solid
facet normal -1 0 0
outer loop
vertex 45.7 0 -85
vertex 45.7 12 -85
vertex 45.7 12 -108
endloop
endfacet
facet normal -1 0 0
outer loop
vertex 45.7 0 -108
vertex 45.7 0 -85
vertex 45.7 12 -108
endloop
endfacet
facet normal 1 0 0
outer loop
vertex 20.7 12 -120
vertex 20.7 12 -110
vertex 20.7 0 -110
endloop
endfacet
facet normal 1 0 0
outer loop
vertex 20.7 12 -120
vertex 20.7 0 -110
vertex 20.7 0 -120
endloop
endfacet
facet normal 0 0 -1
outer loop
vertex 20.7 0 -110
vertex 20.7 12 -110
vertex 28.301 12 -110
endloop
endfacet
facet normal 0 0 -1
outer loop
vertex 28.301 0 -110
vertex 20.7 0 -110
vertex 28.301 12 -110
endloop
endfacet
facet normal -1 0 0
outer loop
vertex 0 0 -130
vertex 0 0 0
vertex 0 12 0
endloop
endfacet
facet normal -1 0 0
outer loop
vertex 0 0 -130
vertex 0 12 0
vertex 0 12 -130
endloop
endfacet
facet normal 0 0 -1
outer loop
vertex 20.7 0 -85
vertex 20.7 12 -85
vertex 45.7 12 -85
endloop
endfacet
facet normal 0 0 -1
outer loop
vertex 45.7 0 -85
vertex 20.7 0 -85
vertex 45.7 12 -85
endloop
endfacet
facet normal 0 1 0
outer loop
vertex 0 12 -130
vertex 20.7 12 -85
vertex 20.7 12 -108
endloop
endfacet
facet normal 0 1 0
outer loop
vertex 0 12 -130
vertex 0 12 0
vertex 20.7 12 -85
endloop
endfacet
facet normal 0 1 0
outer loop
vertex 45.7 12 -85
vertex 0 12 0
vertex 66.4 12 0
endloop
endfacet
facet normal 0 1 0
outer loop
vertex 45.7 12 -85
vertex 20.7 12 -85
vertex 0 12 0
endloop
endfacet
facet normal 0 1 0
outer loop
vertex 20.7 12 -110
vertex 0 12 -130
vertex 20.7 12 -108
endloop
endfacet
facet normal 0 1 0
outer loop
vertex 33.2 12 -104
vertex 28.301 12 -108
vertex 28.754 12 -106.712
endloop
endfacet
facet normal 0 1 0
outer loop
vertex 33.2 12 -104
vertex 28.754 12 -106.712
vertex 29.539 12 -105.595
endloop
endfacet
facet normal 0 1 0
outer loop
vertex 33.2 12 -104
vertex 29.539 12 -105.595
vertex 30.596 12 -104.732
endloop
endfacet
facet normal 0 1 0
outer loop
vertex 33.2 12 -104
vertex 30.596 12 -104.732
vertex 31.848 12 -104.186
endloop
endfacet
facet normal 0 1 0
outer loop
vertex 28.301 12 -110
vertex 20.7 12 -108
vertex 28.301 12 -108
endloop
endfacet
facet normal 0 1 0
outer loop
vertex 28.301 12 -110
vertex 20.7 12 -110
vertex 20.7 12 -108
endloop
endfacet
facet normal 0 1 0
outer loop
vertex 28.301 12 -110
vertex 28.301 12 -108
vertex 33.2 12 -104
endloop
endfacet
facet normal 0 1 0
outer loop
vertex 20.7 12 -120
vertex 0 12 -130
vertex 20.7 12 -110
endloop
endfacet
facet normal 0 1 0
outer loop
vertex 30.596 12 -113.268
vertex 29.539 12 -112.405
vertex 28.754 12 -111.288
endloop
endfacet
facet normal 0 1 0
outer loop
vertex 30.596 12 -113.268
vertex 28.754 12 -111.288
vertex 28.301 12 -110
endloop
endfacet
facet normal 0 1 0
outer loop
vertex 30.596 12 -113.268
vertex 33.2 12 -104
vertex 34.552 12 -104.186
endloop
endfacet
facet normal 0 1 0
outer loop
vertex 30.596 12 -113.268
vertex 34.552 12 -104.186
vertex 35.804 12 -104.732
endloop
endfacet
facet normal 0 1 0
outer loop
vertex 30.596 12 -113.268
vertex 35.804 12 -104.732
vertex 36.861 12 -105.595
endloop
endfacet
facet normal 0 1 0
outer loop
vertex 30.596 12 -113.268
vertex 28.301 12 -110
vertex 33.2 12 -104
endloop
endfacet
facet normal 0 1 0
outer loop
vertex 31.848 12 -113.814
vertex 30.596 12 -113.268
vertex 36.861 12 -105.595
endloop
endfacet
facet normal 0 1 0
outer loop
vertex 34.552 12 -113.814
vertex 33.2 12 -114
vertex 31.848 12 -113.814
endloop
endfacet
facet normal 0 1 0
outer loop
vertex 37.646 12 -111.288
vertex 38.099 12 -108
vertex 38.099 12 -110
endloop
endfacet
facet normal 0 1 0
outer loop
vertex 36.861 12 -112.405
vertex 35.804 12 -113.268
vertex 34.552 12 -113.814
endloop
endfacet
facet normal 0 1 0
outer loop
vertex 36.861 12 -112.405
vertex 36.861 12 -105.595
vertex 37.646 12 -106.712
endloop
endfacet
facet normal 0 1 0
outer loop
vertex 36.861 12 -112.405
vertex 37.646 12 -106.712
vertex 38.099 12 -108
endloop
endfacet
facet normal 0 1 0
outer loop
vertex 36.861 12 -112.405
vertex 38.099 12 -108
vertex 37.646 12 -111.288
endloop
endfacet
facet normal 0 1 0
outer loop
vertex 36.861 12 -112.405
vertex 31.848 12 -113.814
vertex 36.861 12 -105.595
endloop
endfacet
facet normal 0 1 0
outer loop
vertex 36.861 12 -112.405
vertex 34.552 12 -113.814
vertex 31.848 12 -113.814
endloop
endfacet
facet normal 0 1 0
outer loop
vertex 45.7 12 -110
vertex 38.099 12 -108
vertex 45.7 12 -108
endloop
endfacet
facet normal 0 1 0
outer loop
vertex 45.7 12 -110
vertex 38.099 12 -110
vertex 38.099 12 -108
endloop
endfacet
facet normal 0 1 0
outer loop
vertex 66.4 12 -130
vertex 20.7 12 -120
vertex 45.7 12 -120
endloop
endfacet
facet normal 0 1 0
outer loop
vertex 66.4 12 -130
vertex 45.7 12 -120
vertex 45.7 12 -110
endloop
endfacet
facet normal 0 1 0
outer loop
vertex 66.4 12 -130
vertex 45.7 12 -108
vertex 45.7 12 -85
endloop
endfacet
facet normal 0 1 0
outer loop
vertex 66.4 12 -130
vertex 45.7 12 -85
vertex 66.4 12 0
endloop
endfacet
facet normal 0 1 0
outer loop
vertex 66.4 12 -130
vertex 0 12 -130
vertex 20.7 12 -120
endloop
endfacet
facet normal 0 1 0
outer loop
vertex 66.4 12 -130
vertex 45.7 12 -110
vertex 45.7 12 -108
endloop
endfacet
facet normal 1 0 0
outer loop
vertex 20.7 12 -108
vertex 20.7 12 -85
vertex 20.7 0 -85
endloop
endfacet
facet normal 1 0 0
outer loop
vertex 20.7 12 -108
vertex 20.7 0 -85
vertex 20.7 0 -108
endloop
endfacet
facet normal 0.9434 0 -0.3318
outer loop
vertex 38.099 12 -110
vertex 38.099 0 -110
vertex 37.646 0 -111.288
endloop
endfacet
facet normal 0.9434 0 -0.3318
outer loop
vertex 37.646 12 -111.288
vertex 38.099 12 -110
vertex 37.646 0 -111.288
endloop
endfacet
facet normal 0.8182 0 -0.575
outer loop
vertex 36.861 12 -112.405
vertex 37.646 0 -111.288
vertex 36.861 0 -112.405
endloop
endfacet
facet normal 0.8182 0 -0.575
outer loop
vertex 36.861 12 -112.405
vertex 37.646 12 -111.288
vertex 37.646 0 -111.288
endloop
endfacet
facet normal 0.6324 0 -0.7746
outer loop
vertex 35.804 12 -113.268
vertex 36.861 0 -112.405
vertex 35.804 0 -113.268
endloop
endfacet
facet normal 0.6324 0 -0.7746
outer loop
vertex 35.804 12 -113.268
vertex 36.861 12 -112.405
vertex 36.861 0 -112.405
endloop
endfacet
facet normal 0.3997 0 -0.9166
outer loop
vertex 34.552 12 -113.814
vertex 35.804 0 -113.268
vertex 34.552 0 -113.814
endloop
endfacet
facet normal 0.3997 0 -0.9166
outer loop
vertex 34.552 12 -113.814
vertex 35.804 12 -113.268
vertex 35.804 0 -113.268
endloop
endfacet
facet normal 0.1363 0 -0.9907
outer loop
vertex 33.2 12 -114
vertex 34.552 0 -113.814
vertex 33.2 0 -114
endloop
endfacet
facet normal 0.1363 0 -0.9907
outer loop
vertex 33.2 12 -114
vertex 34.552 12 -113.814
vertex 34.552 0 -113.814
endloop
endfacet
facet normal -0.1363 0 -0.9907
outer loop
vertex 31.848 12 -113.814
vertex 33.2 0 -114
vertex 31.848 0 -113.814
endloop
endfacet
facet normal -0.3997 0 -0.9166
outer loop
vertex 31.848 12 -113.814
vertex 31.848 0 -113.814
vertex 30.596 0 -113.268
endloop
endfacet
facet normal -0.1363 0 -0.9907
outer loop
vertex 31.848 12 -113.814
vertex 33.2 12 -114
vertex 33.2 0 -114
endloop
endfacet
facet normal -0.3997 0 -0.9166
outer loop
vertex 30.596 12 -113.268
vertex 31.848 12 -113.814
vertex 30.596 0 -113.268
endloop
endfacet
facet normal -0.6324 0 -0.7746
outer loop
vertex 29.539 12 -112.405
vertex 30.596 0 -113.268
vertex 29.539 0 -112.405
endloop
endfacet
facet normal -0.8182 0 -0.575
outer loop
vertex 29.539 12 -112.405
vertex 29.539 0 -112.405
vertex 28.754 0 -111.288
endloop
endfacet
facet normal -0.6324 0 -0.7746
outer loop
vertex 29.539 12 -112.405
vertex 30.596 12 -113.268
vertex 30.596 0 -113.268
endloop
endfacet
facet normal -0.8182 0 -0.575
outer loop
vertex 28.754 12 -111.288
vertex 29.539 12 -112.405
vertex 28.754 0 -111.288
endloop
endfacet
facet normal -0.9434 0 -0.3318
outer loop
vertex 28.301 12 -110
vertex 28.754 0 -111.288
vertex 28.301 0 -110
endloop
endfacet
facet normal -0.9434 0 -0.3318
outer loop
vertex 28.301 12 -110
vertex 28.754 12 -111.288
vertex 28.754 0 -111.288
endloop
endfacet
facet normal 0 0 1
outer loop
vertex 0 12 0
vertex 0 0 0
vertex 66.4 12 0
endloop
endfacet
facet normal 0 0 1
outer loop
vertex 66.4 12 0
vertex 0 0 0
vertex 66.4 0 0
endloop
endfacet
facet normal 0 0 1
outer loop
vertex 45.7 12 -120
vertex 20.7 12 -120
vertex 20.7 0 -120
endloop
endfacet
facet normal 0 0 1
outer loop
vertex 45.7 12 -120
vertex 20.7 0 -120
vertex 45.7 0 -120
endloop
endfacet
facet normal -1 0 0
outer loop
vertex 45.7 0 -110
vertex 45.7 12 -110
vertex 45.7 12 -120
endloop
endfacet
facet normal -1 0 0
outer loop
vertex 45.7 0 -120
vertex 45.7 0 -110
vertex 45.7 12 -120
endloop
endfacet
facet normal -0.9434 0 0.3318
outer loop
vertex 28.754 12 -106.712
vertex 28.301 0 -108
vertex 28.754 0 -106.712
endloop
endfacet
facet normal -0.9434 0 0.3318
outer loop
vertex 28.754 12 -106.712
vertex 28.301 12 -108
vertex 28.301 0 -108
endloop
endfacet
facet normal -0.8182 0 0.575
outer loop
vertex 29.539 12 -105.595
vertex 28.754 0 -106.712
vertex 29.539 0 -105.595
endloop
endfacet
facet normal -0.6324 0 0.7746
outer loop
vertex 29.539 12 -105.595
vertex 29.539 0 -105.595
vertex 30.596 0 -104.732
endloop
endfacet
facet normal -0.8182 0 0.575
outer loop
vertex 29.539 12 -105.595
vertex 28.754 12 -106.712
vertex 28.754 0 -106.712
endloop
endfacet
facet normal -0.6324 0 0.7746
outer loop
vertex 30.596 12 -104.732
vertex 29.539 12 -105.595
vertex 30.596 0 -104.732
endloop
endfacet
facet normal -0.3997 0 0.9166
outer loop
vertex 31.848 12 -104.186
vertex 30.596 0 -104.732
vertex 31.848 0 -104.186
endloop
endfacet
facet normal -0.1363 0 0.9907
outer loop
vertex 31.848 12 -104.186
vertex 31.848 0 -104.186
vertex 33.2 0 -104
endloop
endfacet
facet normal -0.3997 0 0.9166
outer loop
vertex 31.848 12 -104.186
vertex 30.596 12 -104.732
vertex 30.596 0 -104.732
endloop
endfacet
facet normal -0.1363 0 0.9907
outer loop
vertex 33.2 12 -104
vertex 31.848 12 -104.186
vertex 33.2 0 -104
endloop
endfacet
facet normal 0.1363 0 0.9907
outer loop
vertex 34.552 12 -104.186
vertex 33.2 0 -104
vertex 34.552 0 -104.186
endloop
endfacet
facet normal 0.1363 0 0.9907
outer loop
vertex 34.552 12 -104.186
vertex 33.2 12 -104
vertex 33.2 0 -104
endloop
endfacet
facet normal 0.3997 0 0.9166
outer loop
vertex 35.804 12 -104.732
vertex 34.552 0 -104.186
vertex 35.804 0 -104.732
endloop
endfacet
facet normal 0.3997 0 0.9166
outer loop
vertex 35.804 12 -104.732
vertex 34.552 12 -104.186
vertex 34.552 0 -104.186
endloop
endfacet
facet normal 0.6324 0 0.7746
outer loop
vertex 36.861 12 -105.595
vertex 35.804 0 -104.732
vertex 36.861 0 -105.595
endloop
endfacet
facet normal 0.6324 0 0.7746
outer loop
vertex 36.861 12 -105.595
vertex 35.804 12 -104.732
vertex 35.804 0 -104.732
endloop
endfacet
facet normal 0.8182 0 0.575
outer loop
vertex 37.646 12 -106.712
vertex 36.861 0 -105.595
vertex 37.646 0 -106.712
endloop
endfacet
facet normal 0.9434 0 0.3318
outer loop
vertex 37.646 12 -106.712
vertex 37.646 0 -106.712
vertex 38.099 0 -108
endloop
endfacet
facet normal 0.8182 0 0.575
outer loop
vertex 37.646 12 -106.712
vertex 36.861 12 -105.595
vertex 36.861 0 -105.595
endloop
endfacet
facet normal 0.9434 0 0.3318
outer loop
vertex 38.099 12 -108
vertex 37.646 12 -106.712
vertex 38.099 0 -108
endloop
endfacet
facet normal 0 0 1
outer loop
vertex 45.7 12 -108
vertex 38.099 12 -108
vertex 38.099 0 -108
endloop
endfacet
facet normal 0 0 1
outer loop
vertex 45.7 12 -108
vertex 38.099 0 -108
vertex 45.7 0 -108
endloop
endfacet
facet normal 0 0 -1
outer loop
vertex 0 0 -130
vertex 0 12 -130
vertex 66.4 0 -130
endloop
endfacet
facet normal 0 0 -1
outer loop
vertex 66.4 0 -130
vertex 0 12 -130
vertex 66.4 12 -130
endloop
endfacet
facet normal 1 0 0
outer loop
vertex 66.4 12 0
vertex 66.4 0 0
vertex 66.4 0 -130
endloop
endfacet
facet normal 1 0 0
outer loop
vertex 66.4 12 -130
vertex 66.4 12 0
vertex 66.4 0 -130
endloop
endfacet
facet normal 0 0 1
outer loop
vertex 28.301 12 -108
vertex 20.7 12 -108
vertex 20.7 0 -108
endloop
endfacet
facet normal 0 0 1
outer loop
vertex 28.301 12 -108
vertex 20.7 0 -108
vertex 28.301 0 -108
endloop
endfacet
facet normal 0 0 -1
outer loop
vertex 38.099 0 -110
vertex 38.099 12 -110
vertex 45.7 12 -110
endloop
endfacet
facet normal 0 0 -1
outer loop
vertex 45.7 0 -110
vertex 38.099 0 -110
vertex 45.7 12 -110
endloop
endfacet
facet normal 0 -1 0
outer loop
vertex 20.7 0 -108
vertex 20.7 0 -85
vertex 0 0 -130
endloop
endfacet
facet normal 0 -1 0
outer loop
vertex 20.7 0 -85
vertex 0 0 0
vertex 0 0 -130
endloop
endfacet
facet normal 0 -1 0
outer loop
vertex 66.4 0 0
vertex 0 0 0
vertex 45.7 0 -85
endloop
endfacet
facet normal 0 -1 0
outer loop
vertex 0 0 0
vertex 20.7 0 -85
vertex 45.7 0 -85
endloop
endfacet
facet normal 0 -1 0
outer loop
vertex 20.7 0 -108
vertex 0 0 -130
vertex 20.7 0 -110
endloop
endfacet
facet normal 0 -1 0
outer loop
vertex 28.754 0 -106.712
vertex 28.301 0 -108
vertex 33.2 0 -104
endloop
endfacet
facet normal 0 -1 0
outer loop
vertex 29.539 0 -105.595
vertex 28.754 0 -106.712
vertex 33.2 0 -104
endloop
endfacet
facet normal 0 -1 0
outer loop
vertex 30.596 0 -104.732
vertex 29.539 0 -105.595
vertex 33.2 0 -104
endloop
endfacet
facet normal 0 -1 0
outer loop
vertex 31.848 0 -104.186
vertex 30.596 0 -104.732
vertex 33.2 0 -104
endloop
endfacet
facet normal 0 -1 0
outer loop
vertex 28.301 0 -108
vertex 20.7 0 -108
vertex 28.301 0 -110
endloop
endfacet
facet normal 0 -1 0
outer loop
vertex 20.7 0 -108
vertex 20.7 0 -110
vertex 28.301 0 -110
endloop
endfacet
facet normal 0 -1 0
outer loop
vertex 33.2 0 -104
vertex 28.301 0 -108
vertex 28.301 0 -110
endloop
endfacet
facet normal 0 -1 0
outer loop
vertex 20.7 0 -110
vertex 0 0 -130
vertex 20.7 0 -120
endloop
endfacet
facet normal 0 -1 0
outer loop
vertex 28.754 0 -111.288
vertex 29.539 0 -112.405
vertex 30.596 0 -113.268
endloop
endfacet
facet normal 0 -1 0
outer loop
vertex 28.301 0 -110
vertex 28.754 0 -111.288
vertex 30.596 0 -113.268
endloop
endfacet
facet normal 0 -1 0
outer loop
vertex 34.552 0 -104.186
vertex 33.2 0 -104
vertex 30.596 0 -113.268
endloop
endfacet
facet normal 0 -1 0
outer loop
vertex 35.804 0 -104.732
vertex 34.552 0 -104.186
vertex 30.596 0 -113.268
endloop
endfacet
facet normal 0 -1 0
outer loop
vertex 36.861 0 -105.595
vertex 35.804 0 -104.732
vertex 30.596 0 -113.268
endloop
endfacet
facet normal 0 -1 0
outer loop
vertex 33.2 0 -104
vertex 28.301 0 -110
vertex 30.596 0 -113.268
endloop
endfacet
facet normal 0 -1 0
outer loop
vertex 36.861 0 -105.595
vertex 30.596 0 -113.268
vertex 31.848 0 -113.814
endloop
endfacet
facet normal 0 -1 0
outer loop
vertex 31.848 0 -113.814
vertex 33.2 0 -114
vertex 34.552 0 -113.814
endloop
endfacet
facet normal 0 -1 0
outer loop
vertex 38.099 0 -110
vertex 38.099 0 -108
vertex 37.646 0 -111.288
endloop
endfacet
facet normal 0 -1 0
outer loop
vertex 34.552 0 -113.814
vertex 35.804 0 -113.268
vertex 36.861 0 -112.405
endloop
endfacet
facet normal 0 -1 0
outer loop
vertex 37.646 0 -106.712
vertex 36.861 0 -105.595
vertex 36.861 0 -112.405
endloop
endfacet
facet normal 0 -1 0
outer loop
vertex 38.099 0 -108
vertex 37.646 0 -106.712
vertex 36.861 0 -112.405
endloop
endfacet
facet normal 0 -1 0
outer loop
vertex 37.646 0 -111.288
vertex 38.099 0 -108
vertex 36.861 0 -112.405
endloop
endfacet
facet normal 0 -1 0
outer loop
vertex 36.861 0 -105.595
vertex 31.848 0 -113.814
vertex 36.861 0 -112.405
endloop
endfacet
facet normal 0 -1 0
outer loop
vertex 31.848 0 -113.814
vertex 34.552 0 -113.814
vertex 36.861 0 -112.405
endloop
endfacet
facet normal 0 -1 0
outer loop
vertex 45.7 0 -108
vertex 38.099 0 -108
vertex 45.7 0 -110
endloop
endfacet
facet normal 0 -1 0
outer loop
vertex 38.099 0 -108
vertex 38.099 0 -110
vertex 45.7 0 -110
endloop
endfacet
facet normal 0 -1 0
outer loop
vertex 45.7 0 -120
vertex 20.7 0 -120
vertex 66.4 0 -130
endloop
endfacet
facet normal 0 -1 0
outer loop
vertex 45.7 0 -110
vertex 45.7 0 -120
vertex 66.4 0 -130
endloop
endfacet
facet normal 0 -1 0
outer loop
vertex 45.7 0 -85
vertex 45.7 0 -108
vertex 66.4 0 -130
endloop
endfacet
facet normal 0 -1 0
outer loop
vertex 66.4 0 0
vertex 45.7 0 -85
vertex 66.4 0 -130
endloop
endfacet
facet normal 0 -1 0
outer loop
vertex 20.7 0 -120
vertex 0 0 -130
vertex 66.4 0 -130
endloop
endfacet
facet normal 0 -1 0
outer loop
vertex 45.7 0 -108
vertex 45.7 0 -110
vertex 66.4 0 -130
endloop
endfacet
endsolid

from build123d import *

# Parameters (mm, degrees)
SKETCH1_W           = 66.4
SKETCH1_H           = 130
BOSS_EXTRUDE1_DEPTH = 12
SKETCH2_W           = 25
SKETCH2_H           = 45
CUT_EXTRUDE2_DEPTH  = 20
SKETCH3_W           = 25
SKETCH3_H           = 10
BOSS_EXTRUDE2_DEPTH = 12
SKETCH4_R           = 5
BOSS_EXTRUDE4_DEPTH = 12
SKETCH5_W           = 25
SKETCH5_H           = 2
BOSS_EXTRUDE5_DEPTH = 12


with BuildPart() as part:
    # Sketch1 → Boss-Extrude1 (new body)
    with BuildSketch(Plane(origin=(0, 0, 0), x_dir=(1, 0, 0), z_dir=(0, 1, 0))):
        with Locations((33.2, 65)):
            Rectangle(SKETCH1_W, SKETCH1_H)
    extrude(amount=BOSS_EXTRUDE1_DEPTH)

    # Sketch2 → Cut-Extrude2 (cut)
    with BuildSketch(Plane(origin=(0, 12, 0), x_dir=(1, 0, 0), z_dir=(0, 1, 0))):
        with Locations((33.2, 107.5)):
            Rectangle(SKETCH2_W, SKETCH2_H)
    extrude(amount=-CUT_EXTRUDE2_DEPTH, mode=Mode.SUBTRACT)

    # Sketch3 → Boss-Extrude2 (add)
    with BuildSketch(Plane(origin=(0, 12, 0), x_dir=(1, 0, 0), z_dir=(0, 1, 0))):
        with Locations((33.2, 125)):
            Rectangle(SKETCH3_W, SKETCH3_H)
    extrude(amount=-BOSS_EXTRUDE2_DEPTH)



with BuildPart() as body_2:
    # Sketch4 → Boss-Extrude4 (new body)
    with BuildSketch(Plane(origin=(0, 12, 0), x_dir=(1, 0, 0), z_dir=(0, 1, 0))):
        with Locations(Location((33.2, 109, 0), (0, 0, 270))):
            Circle(SKETCH4_R)
    extrude(amount=-BOSS_EXTRUDE4_DEPTH)


with BuildPart() as part_1:
    add(part.part)

    add(body_2.part)  # Boss-Extrude5 merges body 2
    # Sketch5 → Boss-Extrude5 (add)
    with BuildSketch(Plane(origin=(0, 12, 0), x_dir=(1, 0, 0), z_dir=(0, 1, 0))):
        with Locations((33.2, 109)):
            Rectangle(SKETCH5_W, SKETCH5_H)
    extrude(amount=-BOSS_EXTRUDE5_DEPTH)


solid = part_1.part
